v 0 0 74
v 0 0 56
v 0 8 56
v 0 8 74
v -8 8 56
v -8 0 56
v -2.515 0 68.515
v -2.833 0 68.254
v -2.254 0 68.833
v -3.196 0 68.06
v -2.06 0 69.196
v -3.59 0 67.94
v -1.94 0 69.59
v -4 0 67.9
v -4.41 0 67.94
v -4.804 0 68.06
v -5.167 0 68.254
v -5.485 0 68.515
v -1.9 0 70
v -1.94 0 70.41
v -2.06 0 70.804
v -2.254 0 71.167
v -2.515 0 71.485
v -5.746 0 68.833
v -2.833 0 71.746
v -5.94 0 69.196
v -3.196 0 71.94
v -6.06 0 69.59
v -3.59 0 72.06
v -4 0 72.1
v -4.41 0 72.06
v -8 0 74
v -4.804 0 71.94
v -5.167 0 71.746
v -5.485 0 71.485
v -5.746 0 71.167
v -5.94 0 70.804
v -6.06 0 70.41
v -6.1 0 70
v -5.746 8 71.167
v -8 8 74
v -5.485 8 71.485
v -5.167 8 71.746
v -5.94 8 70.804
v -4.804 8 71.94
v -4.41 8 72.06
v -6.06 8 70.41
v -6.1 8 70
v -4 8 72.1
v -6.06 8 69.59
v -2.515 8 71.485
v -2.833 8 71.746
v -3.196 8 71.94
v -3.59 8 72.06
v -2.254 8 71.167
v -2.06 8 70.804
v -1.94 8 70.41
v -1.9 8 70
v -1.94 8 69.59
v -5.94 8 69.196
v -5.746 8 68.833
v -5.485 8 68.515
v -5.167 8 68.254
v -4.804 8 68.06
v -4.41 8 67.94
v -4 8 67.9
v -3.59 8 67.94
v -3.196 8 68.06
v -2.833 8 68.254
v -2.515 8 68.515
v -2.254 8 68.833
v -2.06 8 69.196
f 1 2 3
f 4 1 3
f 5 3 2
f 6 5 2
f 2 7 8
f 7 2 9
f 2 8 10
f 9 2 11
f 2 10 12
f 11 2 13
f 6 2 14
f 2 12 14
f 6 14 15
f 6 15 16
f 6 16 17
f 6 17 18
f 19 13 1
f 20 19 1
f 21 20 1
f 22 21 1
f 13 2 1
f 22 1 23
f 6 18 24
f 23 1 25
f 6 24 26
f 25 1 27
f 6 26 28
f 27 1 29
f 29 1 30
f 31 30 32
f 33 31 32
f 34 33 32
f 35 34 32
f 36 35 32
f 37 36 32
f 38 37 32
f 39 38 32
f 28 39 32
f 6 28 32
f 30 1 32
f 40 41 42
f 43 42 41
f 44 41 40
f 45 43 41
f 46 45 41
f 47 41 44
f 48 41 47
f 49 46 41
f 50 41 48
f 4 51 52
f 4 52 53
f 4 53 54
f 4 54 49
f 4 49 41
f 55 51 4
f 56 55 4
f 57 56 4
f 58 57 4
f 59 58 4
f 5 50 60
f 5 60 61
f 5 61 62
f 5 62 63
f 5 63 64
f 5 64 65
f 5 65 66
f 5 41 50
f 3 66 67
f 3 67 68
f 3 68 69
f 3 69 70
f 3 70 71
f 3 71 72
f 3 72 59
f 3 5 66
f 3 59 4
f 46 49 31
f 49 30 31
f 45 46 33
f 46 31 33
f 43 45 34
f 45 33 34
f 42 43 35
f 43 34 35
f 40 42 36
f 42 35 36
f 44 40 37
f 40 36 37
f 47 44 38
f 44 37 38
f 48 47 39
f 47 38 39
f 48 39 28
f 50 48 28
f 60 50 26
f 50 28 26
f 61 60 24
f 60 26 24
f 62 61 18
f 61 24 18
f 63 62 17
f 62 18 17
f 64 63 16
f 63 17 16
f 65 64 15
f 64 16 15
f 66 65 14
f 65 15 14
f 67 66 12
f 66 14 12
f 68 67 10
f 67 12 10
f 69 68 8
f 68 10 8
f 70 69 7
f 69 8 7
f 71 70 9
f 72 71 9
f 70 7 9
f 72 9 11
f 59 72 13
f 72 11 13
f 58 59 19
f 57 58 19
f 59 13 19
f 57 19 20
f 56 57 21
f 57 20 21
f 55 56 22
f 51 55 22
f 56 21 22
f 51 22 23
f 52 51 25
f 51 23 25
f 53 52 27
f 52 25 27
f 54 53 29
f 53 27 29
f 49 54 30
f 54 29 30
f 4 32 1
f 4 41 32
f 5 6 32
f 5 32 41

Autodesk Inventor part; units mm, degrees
ref_plane "YZ Plane" through (0, 0, 0) normal (1, 0, 0) x (0, 1, 0)
ref_plane "XZ Plane" through (0, 0, 0) normal (0, 1, 0) x (-1, 0, 0)
sketch "Boceto1" plane through (0, 0, 0) normal (0, 1, 0) x (-1, 0, 0)
  line L0 (0, 0) -> (8, 0)
  line L1 (8, 0) -> (8, 66)
  line L2 (8, 66) -> (0, 66)
  line L3 (0, 66) -> (0, 0)
  dimension "d0" = 8
  dimension "d1" = 66
extrude "Extrusión1" add sketch "Boceto1" along normal blind 8
ref_plane "Plano de trabajo1" through (-12.4, -21.9, 10) normal (0, 0, 1) x (1, 0, 0)
sketch "Boceto2" plane through (-12.4, -21.9, 10) normal (0, 0, 1) x (1, 0, 0)
  line L0 (4.4, 21.9) -> (12.4, 21.9) projected
  line L1 (12.4, 21.9) -> (12.4, 29.9) projected
  line L2 (4.4, 29.9) -> (12.4, 29.9) projected
  line L3 (4.4, 21.9) -> (4.4, 29.9) projected
  line L4 (3.4, 30.9) -> (13.4, 30.9)
  line L5 (13.4, 30.9) -> (13.4, 20.9)
  line L6 (13.4, 20.9) -> (3.4, 20.9)
  line L7 (3.4, 20.9) -> (3.4, 30.9)
  line L8 (4.4, 21.9) -> (3.4, 21.9)
  line L9 (12.4, 21.9) -> (13.4, 21.9)
  dimension "d23" = 1
ref_plane "Plano de trabajo2" through (-29.9, -56.9, 56) normal (0, 0, -1) x (0, 1, 0)
extrude "Extrusión2" add sketch "Boceto2" along normal up to surface (46 mm away) contours L8 L7 L4 L5 L9 L1 L2 L3
sketch "Boceto3" plane through (-8, 0, 66) normal (0, 0, 1) x (1, 0, 0)
  line L0 (0, 0) -> (8, 0) projected
  line L1 (8, 0) -> (8, 8) projected
  line L2 (0, 8) -> (8, 8) projected
  line L3 (0, 0) -> (0, 8) projected
extrude "Extrusión3" add sketch "Boceto3" along normal blind 8
sketch "Boceto4" plane through (0, 0, 0) normal (0, 0, -1) x (-1, 0, 0)
  line L0 (0, 0) -> (8, 0) projected
  line L1 (8, 0) -> (8, 8) projected
  line L2 (0, 8) -> (8, 8) projected
  line L3 (0, 0) -> (0, 8) projected
extrude "Extrusión4" add sketch "Boceto4" along normal blind 8
sketch "Boceto5" plane through (0, 8, 0) normal (0, 1, 0) x (1, 0, 0)
  line L0 (-8, -10) -> (-8, 8) projected
  line L1 (0, -74) -> (-8, -74) projected
  line L2 (0, -56) -> (0, -74) projected
  line L3 (-8, 8) -> (0, 8) projected
  line L4 (0, 8) -> (-8, 8)
  line L5 (-8, 8) -> (-8, 0)
  line L6 (-8, 0) -> (0, 0)
  line L7 (0, 0) -> (0, 8)
  line L8 (0, -74) -> (-8, -74)
  line L9 (-8, -74) -> (-8, -66)
  line L10 (-8, -66) -> (0, -66)
  line L11 (0, -66) -> (0, -74)
  line L12 (0, 8) -> (-8, 0)
  line L13 (0, -74) -> (-8, -66)
  circle A0 centre (-4, 4) radius 2.1
  circle A1 centre (-4, -70) radius 2.1
  line L14 (-8, -10) -> (0, -10) projected
  line L15 (0, -10) -> (0, 8) projected
  line L16 (0, -56) -> (-8, -56) projected
  line L17 (-8, -56) -> (-8, -74) projected
  point P0 (0, 0)
  dimension "d11" = 4.2
  dimension "d12" = 4.2
  dimension "d13" = 8
  dimension "d14" = 8
hole "Agujero1" at (-4, 8, -4) at (-4, 8, 70) direction (0, -1, 0) diameter 4.2 end through all
ref_plane "Plano de trabajo3" through (-12.4, -15.4, 56) normal (0, 0, -1) x (-1, 0, 0)
split "Dividir1" plane through (-12.4, -15.4, 56) removes the side toward (0, 0, -1)
properties part number "Refuerzo superior"
